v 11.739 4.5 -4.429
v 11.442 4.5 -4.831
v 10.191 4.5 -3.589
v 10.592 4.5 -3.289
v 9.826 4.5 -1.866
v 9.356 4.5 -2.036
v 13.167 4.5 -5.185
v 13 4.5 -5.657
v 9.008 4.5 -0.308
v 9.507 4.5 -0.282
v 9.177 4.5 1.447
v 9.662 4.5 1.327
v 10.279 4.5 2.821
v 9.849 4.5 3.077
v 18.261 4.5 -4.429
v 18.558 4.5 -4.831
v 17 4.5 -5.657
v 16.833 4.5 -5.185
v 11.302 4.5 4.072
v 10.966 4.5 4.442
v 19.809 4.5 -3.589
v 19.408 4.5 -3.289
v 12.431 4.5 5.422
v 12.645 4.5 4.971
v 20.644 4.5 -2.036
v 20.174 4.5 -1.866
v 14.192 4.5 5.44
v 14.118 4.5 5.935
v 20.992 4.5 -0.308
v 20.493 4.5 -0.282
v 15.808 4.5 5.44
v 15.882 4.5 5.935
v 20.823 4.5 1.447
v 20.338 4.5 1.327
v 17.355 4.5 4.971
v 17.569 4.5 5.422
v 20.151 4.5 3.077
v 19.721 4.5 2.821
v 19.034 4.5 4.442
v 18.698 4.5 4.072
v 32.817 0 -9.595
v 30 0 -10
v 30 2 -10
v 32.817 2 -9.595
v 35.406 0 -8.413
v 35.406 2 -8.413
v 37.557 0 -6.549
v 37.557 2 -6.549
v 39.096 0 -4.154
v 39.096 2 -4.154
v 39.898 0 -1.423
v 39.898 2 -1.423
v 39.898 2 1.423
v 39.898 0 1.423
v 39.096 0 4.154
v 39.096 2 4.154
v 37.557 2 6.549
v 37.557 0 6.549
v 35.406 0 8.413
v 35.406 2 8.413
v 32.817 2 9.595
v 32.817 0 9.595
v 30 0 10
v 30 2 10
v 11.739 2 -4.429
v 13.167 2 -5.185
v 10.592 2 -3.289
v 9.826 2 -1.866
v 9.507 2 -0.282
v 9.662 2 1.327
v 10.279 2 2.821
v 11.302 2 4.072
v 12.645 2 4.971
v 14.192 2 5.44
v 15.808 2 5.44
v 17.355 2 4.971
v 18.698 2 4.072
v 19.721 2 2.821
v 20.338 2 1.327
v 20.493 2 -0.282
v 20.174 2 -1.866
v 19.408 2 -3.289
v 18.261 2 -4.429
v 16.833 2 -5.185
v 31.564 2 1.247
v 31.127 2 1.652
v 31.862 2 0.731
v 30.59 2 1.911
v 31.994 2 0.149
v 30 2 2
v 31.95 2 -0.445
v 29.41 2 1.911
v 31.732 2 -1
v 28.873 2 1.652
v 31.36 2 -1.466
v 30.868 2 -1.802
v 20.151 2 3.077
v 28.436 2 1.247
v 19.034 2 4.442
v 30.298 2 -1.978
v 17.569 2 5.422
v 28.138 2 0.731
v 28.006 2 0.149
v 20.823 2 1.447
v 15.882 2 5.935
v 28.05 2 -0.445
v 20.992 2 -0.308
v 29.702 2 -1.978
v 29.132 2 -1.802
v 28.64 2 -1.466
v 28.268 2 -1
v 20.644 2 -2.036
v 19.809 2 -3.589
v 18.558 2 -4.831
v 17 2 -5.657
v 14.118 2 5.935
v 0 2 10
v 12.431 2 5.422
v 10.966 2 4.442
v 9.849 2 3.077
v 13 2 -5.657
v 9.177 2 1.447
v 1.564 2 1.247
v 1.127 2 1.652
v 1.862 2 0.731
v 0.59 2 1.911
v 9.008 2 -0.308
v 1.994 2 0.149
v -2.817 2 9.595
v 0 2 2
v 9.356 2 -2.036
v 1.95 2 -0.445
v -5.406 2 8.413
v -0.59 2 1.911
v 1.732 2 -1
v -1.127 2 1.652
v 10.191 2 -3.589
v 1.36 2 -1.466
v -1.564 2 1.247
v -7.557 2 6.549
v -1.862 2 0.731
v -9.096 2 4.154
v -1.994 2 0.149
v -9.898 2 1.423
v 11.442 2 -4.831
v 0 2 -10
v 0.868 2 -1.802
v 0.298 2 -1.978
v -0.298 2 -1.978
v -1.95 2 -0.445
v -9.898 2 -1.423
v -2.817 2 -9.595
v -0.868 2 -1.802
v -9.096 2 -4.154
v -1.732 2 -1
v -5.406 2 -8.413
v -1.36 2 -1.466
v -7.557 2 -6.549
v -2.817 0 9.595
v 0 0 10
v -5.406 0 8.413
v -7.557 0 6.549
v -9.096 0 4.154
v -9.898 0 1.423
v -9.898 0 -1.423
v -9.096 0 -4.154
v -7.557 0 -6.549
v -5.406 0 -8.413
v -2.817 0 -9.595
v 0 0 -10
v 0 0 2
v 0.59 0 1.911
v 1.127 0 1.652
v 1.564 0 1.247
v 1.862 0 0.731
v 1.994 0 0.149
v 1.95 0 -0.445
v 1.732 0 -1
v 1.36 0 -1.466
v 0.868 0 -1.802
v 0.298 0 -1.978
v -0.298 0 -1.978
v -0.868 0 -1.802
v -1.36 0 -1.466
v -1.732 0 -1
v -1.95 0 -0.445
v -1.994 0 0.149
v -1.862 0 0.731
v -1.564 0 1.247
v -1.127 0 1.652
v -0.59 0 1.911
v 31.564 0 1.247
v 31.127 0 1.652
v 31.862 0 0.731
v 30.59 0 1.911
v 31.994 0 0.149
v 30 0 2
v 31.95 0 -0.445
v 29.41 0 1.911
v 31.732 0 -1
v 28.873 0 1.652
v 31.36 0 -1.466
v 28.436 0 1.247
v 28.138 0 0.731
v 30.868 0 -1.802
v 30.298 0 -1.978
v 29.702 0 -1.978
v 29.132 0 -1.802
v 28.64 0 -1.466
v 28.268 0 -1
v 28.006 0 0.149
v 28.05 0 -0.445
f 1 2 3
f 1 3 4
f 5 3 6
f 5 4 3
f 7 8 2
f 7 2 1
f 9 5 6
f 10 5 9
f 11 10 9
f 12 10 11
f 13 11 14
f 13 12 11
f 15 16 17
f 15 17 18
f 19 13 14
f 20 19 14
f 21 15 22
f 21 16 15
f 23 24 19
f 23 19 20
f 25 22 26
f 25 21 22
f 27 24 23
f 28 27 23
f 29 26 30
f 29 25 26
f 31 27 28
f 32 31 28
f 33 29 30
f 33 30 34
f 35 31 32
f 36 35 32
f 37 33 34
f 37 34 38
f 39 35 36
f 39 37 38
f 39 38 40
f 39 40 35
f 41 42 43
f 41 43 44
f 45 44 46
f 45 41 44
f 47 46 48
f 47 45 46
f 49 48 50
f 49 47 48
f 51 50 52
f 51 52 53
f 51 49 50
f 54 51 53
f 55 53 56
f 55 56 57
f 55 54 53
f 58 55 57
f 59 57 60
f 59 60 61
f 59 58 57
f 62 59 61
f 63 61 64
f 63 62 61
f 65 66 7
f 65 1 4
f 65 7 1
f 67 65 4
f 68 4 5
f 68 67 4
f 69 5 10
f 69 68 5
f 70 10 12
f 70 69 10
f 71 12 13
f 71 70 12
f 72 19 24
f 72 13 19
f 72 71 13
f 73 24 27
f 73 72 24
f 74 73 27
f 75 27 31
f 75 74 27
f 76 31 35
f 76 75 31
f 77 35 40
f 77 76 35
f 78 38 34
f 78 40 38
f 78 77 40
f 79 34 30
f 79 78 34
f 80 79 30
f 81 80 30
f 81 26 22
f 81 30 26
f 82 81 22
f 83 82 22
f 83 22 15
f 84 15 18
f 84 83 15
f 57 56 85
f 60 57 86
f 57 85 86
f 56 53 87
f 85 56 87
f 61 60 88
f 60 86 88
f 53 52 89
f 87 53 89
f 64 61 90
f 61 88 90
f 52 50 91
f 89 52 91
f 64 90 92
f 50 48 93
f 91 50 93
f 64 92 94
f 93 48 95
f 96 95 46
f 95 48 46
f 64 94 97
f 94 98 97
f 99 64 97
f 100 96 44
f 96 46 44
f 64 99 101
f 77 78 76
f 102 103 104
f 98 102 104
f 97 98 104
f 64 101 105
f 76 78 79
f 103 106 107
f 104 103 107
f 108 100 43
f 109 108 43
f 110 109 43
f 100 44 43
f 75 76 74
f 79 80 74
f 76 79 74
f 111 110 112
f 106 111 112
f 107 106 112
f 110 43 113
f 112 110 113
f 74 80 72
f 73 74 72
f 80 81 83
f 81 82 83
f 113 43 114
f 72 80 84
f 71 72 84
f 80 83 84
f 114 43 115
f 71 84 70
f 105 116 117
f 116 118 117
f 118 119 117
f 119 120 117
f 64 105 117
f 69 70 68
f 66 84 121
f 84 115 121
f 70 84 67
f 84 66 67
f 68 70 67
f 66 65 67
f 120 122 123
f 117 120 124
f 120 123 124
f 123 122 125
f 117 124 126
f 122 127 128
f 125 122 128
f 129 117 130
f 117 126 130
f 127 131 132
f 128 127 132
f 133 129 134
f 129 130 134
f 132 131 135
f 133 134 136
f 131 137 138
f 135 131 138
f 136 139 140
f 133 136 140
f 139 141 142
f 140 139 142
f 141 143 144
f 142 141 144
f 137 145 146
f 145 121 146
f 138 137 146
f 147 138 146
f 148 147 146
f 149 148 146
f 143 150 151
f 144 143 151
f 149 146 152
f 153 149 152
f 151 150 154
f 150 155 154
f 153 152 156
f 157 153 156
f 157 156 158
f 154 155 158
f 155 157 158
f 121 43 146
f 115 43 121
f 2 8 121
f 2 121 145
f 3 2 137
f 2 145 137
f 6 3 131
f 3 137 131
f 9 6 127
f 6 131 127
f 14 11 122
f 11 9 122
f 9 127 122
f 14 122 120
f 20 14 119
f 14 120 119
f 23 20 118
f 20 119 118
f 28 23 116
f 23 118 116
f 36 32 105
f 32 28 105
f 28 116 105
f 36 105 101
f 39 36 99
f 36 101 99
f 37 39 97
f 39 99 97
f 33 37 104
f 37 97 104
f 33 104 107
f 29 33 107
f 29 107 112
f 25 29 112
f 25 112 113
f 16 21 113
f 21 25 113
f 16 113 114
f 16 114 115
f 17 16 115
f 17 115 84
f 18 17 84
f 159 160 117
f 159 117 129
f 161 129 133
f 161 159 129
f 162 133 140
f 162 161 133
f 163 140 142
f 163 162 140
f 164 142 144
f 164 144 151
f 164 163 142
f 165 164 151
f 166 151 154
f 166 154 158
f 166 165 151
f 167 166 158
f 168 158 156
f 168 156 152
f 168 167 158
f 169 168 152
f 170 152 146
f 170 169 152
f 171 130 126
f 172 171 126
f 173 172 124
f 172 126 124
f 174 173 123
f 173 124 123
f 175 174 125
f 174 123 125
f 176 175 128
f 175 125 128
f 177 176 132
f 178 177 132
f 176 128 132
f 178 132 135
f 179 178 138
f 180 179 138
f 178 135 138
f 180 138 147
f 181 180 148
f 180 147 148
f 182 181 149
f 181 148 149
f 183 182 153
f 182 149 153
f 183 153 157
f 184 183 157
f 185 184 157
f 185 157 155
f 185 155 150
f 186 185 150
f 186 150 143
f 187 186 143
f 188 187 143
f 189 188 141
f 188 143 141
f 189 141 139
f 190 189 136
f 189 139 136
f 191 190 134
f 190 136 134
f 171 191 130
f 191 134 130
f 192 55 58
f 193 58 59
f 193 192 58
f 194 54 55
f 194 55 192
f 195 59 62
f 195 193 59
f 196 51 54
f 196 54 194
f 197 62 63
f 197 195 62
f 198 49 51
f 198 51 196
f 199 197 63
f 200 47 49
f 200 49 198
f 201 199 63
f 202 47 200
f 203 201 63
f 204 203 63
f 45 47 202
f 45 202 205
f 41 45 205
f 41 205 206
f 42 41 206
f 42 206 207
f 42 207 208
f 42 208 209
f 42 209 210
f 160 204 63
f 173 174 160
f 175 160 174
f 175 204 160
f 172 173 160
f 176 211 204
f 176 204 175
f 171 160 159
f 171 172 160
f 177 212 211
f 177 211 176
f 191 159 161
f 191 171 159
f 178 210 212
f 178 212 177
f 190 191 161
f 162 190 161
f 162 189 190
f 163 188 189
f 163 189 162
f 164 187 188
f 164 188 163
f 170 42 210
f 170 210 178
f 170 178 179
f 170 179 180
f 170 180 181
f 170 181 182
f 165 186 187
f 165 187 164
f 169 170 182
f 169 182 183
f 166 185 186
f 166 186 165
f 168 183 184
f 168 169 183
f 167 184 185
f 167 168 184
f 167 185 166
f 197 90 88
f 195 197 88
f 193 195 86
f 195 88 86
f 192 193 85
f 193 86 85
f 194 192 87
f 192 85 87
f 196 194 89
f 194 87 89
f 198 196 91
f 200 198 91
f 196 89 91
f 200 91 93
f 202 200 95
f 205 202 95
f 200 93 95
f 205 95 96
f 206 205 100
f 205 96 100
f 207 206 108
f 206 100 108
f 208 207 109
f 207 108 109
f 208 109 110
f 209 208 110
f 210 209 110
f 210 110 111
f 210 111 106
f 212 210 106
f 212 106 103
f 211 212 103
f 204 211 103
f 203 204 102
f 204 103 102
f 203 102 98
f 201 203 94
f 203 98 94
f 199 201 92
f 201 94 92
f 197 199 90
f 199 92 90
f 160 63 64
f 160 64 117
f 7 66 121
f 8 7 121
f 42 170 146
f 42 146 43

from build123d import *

# Parameters (mm, degrees)
EXTRUDE_1_DEPTH     = 2
SKETCH_2_R          = 2
CUT_EXTRUDE_1_DEPTH = 2
SKETCH_3_R          = 6
SKETCH_3_R_2        = 5.5
EXTRUDE_2_DEPTH     = 2.5
CUT_EXTRUDE_2_DEPTH = 2.5


with BuildPart() as part:
    # 草图1 → 凸台-拉伸1 (new body)
    with BuildSketch(Plane(origin=(0, 0, 0), x_dir=(1, 0, 0), z_dir=(0, 1, 0))):
        with BuildLine():
            Line((0, 10), (30, 10))
            ThreePointArc((30, 10), (40, 0), (30, -10))
            Line((30, -10), (0, -10))
            ThreePointArc((0, -10), (-10, 0), (0, 10))
        make_face()
    extrude(amount=EXTRUDE_1_DEPTH)

    # 草图2 → 切除-拉伸1 (cut)
    with BuildSketch(Plane(origin=(0, 2, 0), x_dir=(1, 0, 0), z_dir=(0, 1, 0))):
        with Locations(Location((0, 0, 0), (0, 0, 270))):
            Circle(SKETCH_2_R)
        with Locations(Location((30, 0, 0), (0, 0, 270))):
            Circle(SKETCH_2_R)
    extrude(amount=-CUT_EXTRUDE_1_DEPTH, mode=Mode.SUBTRACT)

    # 草图3 → 凸台-拉伸2 (add)
    with BuildSketch(Plane(origin=(0, 2, 0), x_dir=(1, 0, 0), z_dir=(0, 1, 0))):
        with Locations(Location((15, 0, 0), (0, 0, 270))):
            Circle(SKETCH_3_R)
        with Locations(Location((15, 0, 0), (0, 0, 270))):
            Circle(SKETCH_3_R_2, mode=Mode.SUBTRACT)
    extrude(amount=EXTRUDE_2_DEPTH)

    # 草图4 → 切除-拉伸2 (cut)
    with BuildSketch(Plane(origin=(0, 2, 0), x_dir=(1, 0, 0), z_dir=(0, 1, 0))):
        with BuildLine():
            Line((15, 0), (13, 5.656854249))
            ThreePointArc((13, 5.656854249), (15, 6), (17, 5.656854249))
            Line((17, 5.656854249), (15, 0))
        make_face()
    extrude(amount=CUT_EXTRUDE_2_DEPTH, mode=Mode.SUBTRACT)


solid = part.part
